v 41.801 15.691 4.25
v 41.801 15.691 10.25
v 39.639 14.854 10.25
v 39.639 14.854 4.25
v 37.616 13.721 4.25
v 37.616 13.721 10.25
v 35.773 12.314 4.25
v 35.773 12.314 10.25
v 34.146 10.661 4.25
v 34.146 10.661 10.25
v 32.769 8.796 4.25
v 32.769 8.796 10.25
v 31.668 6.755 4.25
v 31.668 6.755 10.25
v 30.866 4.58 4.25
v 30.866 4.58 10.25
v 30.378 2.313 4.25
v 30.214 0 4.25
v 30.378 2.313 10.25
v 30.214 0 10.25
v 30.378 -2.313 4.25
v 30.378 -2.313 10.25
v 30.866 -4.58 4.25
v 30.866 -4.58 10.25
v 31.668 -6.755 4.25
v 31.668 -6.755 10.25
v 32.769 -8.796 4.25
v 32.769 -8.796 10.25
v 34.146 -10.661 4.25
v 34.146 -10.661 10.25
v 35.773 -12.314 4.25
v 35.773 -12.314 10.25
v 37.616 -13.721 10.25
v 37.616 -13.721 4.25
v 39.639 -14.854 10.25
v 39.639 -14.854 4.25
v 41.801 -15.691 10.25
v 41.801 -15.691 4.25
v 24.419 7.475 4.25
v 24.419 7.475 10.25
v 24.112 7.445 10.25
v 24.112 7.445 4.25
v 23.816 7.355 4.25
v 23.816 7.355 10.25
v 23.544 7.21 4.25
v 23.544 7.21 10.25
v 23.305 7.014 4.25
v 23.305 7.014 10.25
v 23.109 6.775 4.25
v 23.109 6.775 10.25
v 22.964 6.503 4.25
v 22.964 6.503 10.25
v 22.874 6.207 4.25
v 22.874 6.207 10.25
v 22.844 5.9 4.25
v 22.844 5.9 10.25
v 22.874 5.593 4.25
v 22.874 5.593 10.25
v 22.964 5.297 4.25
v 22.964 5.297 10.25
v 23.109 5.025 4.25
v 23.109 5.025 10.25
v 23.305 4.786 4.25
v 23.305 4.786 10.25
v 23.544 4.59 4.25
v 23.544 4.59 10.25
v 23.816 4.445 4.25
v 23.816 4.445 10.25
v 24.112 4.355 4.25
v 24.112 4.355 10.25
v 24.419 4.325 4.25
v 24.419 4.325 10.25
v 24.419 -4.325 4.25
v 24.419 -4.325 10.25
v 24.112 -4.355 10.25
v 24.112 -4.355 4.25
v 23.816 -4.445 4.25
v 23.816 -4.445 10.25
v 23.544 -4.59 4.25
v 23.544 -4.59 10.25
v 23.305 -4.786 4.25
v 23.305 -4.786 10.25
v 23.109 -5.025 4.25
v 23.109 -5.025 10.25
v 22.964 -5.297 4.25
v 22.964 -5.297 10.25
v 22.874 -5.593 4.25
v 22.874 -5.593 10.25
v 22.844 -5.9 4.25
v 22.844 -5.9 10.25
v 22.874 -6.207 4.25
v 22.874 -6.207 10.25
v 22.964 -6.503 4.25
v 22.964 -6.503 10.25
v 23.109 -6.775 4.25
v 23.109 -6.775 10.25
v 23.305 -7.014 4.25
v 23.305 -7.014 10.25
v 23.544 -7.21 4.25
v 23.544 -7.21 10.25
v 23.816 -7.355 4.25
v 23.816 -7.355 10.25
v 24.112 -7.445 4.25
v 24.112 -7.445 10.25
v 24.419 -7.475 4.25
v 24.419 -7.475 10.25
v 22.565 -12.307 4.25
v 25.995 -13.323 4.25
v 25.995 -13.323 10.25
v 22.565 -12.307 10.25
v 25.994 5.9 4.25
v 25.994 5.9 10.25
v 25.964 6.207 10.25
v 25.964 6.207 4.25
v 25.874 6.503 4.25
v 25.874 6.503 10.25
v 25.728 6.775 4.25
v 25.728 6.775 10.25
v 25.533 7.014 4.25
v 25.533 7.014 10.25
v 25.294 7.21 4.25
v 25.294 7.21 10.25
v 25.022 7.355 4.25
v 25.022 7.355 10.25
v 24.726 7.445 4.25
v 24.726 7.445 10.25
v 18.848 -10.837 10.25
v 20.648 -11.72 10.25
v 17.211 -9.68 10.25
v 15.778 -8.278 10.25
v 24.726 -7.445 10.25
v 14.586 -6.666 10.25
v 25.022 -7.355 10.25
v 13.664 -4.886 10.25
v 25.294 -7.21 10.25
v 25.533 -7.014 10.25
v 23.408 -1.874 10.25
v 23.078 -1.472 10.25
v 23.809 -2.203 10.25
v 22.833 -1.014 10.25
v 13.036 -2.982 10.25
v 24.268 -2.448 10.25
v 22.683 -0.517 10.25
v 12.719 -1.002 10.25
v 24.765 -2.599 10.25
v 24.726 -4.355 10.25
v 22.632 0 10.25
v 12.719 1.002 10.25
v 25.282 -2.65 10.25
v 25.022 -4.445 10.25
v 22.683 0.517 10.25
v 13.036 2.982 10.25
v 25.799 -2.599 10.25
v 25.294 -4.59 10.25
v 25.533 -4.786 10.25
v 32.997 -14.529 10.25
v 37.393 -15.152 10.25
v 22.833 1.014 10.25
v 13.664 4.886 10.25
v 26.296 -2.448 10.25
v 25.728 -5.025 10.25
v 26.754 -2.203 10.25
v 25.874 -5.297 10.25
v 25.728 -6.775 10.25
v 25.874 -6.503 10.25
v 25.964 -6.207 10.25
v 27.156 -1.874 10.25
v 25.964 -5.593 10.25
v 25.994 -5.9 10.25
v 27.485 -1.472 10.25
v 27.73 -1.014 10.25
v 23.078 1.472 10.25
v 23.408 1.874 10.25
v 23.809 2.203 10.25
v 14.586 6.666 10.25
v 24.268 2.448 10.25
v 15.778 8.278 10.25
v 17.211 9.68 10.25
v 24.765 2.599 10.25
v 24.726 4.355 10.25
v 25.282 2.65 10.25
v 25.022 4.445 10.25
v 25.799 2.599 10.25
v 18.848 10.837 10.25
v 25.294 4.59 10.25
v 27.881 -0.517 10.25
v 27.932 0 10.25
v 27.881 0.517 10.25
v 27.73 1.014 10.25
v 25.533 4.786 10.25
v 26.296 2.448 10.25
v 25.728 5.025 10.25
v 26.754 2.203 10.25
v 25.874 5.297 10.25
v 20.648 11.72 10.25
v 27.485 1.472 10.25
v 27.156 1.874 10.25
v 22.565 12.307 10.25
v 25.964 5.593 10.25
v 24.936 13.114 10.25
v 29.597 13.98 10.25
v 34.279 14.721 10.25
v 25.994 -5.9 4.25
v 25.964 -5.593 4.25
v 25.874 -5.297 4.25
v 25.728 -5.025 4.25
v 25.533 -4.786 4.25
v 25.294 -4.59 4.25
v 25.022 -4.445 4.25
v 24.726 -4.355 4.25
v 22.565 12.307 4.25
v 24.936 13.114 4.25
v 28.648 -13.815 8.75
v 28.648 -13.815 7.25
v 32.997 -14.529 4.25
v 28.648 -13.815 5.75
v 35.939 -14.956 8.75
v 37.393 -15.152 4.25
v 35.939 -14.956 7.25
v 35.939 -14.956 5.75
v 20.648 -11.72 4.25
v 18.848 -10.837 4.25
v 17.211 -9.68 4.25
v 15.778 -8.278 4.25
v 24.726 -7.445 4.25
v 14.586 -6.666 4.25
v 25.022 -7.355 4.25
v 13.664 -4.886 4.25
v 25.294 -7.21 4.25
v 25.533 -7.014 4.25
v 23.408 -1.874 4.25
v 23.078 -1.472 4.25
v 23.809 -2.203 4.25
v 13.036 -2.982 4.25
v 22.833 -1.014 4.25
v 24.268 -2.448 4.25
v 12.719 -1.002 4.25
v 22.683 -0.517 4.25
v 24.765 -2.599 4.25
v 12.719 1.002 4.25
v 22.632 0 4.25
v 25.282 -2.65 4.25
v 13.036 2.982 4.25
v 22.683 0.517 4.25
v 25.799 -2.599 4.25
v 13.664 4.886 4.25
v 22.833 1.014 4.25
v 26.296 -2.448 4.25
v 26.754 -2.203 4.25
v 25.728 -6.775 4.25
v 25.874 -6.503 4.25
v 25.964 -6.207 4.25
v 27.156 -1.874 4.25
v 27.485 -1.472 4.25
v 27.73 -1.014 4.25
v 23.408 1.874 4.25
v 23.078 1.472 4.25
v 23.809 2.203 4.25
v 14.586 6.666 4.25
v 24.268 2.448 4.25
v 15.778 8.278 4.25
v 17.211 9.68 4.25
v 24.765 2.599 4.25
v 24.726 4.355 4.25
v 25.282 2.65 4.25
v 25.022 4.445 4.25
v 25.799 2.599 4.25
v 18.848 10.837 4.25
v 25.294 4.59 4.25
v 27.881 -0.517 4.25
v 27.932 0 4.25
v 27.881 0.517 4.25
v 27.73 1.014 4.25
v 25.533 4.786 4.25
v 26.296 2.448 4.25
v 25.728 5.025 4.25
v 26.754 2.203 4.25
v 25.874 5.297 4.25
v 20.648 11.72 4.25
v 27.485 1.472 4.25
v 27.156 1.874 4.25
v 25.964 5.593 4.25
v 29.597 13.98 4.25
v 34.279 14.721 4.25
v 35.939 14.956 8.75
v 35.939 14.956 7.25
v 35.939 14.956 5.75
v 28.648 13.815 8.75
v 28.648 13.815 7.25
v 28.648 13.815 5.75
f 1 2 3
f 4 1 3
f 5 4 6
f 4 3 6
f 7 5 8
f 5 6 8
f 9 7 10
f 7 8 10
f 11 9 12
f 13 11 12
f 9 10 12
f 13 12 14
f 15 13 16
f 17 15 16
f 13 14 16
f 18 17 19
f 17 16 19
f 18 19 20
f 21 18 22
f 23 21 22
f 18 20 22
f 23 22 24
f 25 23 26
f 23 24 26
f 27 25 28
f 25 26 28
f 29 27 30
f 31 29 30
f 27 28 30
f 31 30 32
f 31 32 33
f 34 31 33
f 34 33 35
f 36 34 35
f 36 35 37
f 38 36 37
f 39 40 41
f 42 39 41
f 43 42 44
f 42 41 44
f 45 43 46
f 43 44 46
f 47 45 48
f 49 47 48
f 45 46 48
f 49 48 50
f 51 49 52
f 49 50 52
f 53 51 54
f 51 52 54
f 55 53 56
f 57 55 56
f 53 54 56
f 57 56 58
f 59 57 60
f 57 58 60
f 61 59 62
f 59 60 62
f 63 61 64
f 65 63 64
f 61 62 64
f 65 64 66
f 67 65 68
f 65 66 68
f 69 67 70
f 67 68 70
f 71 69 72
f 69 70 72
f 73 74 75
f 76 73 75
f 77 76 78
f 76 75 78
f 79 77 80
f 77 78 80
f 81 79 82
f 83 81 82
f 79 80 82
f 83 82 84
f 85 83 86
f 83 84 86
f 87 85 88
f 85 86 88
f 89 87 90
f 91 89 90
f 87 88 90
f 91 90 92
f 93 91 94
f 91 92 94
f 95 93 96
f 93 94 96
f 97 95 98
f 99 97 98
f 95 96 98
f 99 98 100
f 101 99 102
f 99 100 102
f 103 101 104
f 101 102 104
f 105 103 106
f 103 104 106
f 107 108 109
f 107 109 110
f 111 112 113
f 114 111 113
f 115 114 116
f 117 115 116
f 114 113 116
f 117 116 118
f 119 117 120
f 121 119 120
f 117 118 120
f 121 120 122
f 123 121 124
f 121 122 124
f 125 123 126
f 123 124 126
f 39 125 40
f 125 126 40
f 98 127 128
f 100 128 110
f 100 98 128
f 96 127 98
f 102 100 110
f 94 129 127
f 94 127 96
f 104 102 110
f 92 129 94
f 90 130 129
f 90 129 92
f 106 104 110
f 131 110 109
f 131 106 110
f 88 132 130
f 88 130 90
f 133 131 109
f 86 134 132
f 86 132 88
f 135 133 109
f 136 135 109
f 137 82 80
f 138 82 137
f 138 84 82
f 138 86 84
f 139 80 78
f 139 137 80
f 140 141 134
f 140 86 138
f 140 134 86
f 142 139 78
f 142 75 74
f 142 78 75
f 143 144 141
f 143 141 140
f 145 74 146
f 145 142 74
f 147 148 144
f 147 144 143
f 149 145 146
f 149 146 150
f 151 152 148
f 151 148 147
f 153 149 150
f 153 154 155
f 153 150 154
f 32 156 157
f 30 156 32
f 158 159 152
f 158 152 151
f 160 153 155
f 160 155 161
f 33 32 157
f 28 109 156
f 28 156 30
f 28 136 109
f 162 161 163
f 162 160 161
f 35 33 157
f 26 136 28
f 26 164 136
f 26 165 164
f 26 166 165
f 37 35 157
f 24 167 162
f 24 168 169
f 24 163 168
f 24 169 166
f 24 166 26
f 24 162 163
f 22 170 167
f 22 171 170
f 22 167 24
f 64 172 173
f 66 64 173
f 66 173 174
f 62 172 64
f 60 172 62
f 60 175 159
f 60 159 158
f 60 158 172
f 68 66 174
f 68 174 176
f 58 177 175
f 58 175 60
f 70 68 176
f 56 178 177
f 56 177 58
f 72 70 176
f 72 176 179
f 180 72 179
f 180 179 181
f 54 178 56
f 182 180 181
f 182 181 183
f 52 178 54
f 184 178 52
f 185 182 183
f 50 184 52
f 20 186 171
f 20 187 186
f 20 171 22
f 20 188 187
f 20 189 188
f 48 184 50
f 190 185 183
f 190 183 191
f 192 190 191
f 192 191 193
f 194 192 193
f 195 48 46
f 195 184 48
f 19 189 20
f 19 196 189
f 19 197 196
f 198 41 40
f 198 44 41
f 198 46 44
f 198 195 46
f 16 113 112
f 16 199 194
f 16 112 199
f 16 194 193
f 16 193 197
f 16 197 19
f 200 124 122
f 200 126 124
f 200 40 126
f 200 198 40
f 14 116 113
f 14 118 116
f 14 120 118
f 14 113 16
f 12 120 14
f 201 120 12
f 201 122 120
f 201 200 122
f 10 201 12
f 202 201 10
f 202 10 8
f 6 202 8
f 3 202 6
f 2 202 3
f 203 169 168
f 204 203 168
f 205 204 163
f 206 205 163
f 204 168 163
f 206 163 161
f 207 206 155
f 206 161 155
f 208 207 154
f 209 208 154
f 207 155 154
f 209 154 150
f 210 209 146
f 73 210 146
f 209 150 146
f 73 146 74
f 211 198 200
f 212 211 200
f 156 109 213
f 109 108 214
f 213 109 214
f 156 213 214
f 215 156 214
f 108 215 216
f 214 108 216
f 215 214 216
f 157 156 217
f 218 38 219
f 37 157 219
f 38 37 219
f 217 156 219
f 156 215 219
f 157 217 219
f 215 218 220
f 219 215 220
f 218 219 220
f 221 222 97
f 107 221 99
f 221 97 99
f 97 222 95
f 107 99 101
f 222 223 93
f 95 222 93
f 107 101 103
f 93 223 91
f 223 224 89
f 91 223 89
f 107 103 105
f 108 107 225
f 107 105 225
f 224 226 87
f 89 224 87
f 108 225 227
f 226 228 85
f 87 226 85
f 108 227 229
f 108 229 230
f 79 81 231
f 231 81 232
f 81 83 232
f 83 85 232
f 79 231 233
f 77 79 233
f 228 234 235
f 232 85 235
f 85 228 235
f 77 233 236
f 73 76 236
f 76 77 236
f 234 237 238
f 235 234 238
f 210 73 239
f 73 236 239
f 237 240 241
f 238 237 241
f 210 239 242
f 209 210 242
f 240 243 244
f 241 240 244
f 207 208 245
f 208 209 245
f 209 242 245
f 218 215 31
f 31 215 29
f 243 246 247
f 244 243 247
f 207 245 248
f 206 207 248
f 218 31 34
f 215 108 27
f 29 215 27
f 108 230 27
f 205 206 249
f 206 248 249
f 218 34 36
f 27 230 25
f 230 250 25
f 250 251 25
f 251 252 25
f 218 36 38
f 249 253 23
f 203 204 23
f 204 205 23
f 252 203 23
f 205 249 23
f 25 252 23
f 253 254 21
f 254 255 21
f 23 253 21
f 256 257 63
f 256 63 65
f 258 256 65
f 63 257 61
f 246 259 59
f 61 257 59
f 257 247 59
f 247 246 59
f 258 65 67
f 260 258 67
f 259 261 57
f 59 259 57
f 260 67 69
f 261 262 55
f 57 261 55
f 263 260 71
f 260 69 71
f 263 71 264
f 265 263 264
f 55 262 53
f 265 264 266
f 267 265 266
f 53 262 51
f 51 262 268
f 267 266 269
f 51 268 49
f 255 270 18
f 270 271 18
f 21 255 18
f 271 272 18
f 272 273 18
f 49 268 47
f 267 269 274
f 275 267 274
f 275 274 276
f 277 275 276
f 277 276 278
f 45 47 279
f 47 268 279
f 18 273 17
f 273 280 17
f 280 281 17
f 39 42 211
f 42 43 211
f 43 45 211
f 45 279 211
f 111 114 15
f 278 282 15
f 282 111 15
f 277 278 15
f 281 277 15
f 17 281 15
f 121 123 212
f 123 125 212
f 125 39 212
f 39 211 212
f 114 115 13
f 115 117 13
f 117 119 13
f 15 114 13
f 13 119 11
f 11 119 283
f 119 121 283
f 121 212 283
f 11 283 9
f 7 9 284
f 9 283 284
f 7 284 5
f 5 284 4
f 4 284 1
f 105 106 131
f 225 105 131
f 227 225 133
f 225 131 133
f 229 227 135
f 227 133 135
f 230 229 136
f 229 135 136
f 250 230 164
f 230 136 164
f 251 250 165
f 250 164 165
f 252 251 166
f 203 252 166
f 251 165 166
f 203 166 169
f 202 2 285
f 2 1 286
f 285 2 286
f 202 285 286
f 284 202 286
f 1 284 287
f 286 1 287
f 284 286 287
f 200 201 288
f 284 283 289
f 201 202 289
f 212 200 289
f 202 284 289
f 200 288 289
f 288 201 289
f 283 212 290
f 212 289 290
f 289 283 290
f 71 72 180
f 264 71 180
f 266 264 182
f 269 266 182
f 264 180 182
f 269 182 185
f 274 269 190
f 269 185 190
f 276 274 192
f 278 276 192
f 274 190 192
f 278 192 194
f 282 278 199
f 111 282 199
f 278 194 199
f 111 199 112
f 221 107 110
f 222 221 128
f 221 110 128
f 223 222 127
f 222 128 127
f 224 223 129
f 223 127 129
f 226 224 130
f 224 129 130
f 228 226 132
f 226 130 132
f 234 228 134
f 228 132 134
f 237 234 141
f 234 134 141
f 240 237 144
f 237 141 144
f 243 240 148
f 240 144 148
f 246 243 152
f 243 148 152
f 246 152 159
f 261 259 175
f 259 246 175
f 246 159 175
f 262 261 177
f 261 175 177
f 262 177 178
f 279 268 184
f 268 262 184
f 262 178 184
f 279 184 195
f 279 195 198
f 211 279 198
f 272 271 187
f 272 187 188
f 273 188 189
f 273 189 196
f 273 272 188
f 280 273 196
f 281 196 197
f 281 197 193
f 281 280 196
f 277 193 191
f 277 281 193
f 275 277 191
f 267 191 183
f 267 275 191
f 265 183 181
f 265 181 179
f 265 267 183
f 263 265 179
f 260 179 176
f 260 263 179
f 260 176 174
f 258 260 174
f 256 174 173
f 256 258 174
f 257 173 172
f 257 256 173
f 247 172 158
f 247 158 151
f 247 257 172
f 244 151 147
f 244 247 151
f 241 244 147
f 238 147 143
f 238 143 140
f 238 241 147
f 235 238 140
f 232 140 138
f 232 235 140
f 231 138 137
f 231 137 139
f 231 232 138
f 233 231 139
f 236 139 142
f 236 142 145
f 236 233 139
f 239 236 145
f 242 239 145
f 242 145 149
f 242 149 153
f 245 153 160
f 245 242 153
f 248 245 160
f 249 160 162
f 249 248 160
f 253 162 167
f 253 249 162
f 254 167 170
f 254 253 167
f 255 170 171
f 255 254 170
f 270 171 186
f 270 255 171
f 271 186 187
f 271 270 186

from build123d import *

# Parameters (mm, degrees)
BOSS_EXTRUDE1_START     = 4.25
BOSS_EXTRUDE1_OUTLINE_R = 2.65
BOSS_EXTRUDE1_DEPTH     = 6
CUT_EXTRUDE2_DEPTH      = 49.147003594
CUT_EXTRUDE3_DEPTH      = 46.050777478


# Read off the part's stored shape, not the designer's step: Boss-Extrude1
with BuildPart() as part:
    # Boss-Extrude1 outline → Boss-Extrude1 (new body)
    with BuildSketch(Plane.XY.offset(BOSS_EXTRUDE1_START)):
        with BuildLine():
            ThreePointArc((22.5, 12.599580353), (12.378691282, 0), (22.5, -12.599580353))
            add(Edge.make_bspline(
                [(22.5, -12.599580353), (24.539912926, -13.049943774), (29.005619164, -13.923317691), (36.155474951, -15.030554758), (41.619048326, -15.685620583), (44.644632939, -15.999223801), (45, -16.035396523)],
                knots=[0.544361959, 0.544361959, 0.544361959, 0.544361959, 0.554606397, 0.566671735, 0.579837557, 0.581589368, 0.581589368, 0.581589368, 0.581589368], degree=3))
            ThreePointArc((45, -16.035396523), (30.513983858, 0), (45, 16.035396523))
            add(Edge.make_bspline(
                [(45, 16.035396523), (44.644632939, 15.999223801), (41.619048326, 15.685620583), (36.155474951, 15.030554758), (29.005619164, 13.923317691), (24.539912926, 13.049943774), (22.5, 12.599580353)],
                knots=[0.418410632, 0.418410632, 0.418410632, 0.418410632, 0.420162443, 0.433328265, 0.445393603, 0.455638041, 0.455638041, 0.455638041, 0.455638041], degree=3))
        make_face()
        with Locations((25.281682512, 0)):
            Circle(BOSS_EXTRUDE1_OUTLINE_R, mode=Mode.SUBTRACT)
    extrude(amount=BOSS_EXTRUDE1_DEPTH)

    # Sketch3 → Cut-Extrude2 (cut, through all)
    with BuildSketch(Plane.XY.offset(10.25)):
        with BuildLine():
            ThreePointArc((22.564675294, -12.306634784), (12.678691282, 0), (22.564675294, 12.306634784))
            Line((22.564675294, 12.306634784), (24.936220162, 13.113775399))
            add(Edge.make_bspline(
                [(24.936220162, 13.113775399), (24.122635067, 12.949661044), (23.310473255, 12.77851324), (22.5, 12.599580353)],
                knots=[0.451567846, 0.451567846, 0.451567846, 0.451567846, 0.455638041, 0.455638041, 0.455638041, 0.455638041], degree=3))
            ThreePointArc((22.5, 12.599580353), (12.378691282, 0), (22.5, -12.599580353))
            add(Edge.make_bspline(
                [(22.5, -12.599580353), (23.661751431, -12.856066962), (24.826972348, -13.096557541), (25.994881444, -13.323265839)],
                knots=[0.544361959, 0.544361959, 0.544361959, 0.544361959, 0.550196272, 0.550196272, 0.550196272, 0.550196272], degree=3))
            Line((25.994881444, -13.323265839), (22.564675294, -12.306634784))
        make_face()
        with BuildLine():
            add(Edge.make_bspline(
                [(45, 16.035396523), (44.644632939, 15.999223801), (43.577975433, 15.888664266), (42.511942906, 15.772070236), (41.801329262, 15.691443866)],
                knots=[0.418410632, 0.418410632, 0.418410632, 0.418410632, 0.420162443, 0.423669783, 0.423669783, 0.423669783, 0.423669783], degree=3))
            ThreePointArc((41.801329262, 15.691443866), (30.213983858, 0), (41.801329262, -15.691443866))
            add(Edge.make_bspline(
                [(41.801329262, -15.691443866), (42.511942906, -15.772070236), (43.577975433, -15.888664266), (44.644632939, -15.999223801), (45, -16.035396523)],
                knots=[0.576330217, 0.576330217, 0.576330217, 0.576330217, 0.579837557, 0.581589368, 0.581589368, 0.581589368, 0.581589368], degree=3))
            ThreePointArc((45, -16.035396523), (30.513983858, 0), (45, 16.035396523))
        make_face()
    extrude(amount=-CUT_EXTRUDE2_DEPTH, mode=Mode.SUBTRACT)

    # Sketch4 → Cut-Extrude3 (cut, through all)
    with BuildSketch(Plane.XY.offset(10.25)):
        with BuildLine():
            ThreePointArc((25.993828758, 5.9), (25.532521939, 7.01369318), (24.418828758, 7.475))
            Line((24.418828758, 7.475), (24.418828758, 4.325))
            ThreePointArc((24.418828758, 4.325), (25.532521939, 4.78630682), (25.993828758, 5.9))
        make_face()
        with BuildLine():
            Line((24.418828758, 4.325), (24.418828758, 7.475))
            ThreePointArc((24.418828758, 7.475), (22.843828758, 5.9), (24.418828758, 4.325))
        make_face()
        with BuildLine():
            ThreePointArc((25.993828758, -5.9), (25.532521939, -4.78630682), (24.418828758, -4.325))
            Line((24.418828758, -4.325), (24.418828758, -7.475))
            ThreePointArc((24.418828758, -7.475), (25.532521939, -7.01369318), (25.993828758, -5.9))
        make_face()
        with BuildLine():
            Line((24.418828758, -7.475), (24.418828758, -4.325))
            ThreePointArc((24.418828758, -4.325), (22.843828758, -5.9), (24.418828758, -7.475))
        make_face()
    extrude(amount=-CUT_EXTRUDE3_DEPTH, mode=Mode.SUBTRACT)


solid = part.part
